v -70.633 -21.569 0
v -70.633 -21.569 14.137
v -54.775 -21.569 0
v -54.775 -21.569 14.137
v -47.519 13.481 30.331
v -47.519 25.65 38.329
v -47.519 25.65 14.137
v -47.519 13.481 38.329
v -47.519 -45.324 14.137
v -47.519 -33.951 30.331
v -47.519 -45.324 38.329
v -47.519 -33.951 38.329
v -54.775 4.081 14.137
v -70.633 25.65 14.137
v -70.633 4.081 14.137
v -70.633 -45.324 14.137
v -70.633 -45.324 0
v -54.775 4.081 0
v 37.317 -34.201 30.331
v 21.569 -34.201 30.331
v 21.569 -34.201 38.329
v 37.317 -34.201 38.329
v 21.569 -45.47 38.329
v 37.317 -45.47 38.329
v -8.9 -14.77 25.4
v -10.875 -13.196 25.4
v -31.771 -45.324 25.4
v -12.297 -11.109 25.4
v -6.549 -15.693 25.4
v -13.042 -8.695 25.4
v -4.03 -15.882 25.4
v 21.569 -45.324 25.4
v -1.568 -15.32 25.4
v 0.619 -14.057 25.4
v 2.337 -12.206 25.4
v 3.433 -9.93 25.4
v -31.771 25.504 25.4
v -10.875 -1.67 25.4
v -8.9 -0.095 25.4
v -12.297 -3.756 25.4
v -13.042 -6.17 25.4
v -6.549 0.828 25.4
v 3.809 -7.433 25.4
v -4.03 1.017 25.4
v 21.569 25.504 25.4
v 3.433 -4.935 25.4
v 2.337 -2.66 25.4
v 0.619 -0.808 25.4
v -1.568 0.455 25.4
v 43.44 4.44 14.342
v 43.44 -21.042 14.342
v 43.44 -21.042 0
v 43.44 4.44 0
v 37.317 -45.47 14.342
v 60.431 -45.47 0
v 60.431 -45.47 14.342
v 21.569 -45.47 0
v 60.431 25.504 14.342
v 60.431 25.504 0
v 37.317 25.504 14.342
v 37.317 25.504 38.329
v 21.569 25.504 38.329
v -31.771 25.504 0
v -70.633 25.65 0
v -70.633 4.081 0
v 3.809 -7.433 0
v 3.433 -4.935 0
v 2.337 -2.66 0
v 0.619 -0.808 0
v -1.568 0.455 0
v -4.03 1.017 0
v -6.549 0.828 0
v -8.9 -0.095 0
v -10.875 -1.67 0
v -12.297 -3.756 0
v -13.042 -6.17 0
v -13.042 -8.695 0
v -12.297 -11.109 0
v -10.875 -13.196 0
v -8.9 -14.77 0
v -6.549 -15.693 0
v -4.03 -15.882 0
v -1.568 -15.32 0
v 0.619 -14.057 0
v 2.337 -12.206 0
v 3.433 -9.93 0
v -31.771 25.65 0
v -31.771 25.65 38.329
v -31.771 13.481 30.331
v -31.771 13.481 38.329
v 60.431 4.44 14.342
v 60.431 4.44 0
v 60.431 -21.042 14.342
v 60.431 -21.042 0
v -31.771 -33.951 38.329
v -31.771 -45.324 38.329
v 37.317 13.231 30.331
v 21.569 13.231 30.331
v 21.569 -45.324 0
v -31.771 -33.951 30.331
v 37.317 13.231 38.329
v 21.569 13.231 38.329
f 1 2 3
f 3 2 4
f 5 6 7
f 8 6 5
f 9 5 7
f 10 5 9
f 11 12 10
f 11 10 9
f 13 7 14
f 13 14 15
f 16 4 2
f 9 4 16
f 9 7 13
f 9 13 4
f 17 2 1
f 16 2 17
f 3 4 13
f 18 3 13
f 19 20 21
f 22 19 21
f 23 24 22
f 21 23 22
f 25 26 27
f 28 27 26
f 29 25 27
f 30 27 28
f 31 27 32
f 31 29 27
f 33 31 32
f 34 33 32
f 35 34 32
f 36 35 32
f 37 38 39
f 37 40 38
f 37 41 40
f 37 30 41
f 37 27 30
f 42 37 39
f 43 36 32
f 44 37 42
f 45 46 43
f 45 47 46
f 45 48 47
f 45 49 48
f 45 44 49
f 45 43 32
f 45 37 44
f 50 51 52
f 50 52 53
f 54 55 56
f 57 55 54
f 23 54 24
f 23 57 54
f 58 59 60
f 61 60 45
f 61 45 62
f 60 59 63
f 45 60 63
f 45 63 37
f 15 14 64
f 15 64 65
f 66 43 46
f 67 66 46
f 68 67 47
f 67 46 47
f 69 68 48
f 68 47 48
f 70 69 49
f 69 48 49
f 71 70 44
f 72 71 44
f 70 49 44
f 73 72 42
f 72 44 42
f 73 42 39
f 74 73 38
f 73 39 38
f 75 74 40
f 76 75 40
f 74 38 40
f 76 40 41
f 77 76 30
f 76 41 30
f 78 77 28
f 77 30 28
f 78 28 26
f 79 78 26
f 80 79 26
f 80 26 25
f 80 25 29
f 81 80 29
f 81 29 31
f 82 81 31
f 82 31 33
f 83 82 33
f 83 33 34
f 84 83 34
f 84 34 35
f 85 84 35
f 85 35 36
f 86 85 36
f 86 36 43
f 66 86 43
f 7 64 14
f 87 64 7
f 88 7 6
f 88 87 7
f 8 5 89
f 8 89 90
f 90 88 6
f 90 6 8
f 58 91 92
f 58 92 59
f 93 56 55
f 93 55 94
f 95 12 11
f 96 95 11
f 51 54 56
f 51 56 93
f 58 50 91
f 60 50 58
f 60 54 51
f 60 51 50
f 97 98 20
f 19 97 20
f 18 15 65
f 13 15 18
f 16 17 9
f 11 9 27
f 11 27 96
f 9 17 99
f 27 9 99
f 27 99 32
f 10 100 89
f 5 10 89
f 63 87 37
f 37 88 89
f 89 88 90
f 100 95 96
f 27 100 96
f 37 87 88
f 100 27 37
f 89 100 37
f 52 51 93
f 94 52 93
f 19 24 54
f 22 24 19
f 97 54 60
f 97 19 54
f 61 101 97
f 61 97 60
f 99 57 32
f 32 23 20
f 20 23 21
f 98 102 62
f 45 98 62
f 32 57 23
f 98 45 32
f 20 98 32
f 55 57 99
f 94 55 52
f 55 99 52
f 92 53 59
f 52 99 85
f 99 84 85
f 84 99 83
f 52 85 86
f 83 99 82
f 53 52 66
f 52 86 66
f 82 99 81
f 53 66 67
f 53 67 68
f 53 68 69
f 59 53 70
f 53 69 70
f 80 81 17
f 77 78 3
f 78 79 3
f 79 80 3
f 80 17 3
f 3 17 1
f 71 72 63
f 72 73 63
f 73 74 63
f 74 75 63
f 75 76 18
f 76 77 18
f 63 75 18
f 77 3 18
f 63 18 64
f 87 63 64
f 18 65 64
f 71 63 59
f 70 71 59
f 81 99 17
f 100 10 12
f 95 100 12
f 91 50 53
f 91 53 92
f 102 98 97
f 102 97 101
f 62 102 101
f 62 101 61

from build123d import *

# Parameters (mm, degrees)
F0_W      = 53.3400028944
F0_H      = 70.8285234869
F1_DEPTH  = 25.4
F2_R      = 8.4728642263
F3_DEPTH  = 41.402
F4_W      = 70.9742624313
F4_H      = 38.3290164173
F5_DEPTH  = 15.748
F6_W      = 70.9742605686
F6_H      = 38.3290164173
F7_DEPTH  = 15.748
F8_W      = 70.9742624313
F8_H      = 14.1365574673
F9_DEPTH  = 23.114
F10_W     = 70.9742605686
F10_H     = 14.3422139809
F11_DEPTH = 23.114
F12_W     = 16.9909100647
F12_H     = 25.4818284884
F13_DEPTH = 25.4
F14_W     = 15.8581200655
F14_H     = 25.6498372182
F15_DEPTH = 25.4
F16_W     = 47.4318256602
F16_H     = 7.9976115376
F17_DEPTH = 25.4
F18_W     = 47.4318237975
F18_H     = 7.9976115376
F19_DEPTH = 25.4


with BuildPart() as f1:
    # F0 (on Top) → F1 (new body)
    with BuildSketch(Plane.XY):
        with Locations((-5.1008202136, -9.9101644009)):
            Rectangle(F0_W, F0_H)
    extrude(amount=F1_DEPTH)

    # F2 (on face) → F3 (cut)
    with BuildSketch(Plane.XY.offset(25.4)):
        with Locations((-4.66360664, -7.4326233007)):
            Circle(F2_R)
    extrude(amount=-F3_DEPTH, mode=Mode.SUBTRACT)

    # F4 (on face) → F5 (join)
    with BuildSketch(Plane(origin=(-31.7708216608, 0, 0), x_dir=(0, -1, 0), z_dir=(-1, 0, 0))):
        with Locations((9.8372949287, 19.1645082086)):
            Rectangle(F4_W, F4_H)
    extrude(amount=F5_DEPTH)

    # F6 (on face) → F7 (join)
    with BuildSketch(Plane.YZ.offset(21.5691812336)):
        with Locations((-9.9830329418, 19.1645082086)):
            Rectangle(F6_W, F6_H)
    extrude(amount=F7_DEPTH)

    # F8 (on face) → F9 (join)
    with BuildSketch(Plane(origin=(-47.5188216608, 0, 0), x_dir=(0, -1, 0), z_dir=(-1, 0, 0))):
        with Locations((9.8372949287, 7.0682787336)):
            Rectangle(F8_W, F8_H)
    extrude(amount=F9_DEPTH)

    # F10 (on face) → F11 (join)
    with BuildSketch(Plane.YZ.offset(37.3171812336)):
        with Locations((-9.9830329418, 7.1711069904)):
            Rectangle(F10_W, F10_H)
    extrude(amount=F11_DEPTH)

    # F12 (on face) → F13 (cut)
    with BuildSketch(Plane.XY.offset(14.3422139809)):
        with Locations((51.9357262013, -8.3012259565)):
            Rectangle(F12_W, F12_H)
    extrude(amount=-F13_DEPTH, mode=Mode.SUBTRACT)

    # F14 (on face) → F15 (cut)
    with BuildSketch(Plane.XY.offset(14.1365574673)):
        with Locations((-62.703761628, -8.7442626245)):
            Rectangle(F14_W, F14_H)
    extrude(amount=-F15_DEPTH, mode=Mode.SUBTRACT)

    # F16 (on face) → F17 (cut)
    with BuildSketch(Plane(origin=(21.5691812336, 0, 0), x_dir=(0, -1, 0), z_dir=(-1, 0, 0))):
        with Locations((10.4849305935, 34.3302106485)):
            Rectangle(F16_W, F16_H)
    extrude(amount=-F17_DEPTH, mode=Mode.SUBTRACT)

    # F18 (on face) → F19 (cut)
    with BuildSketch(Plane.YZ.offset(-31.7708216608)):
        with Locations((-10.2352886461, 34.3302106485)):
            Rectangle(F18_W, F18_H)
    extrude(amount=-F19_DEPTH, mode=Mode.SUBTRACT)


solid = f1.part
